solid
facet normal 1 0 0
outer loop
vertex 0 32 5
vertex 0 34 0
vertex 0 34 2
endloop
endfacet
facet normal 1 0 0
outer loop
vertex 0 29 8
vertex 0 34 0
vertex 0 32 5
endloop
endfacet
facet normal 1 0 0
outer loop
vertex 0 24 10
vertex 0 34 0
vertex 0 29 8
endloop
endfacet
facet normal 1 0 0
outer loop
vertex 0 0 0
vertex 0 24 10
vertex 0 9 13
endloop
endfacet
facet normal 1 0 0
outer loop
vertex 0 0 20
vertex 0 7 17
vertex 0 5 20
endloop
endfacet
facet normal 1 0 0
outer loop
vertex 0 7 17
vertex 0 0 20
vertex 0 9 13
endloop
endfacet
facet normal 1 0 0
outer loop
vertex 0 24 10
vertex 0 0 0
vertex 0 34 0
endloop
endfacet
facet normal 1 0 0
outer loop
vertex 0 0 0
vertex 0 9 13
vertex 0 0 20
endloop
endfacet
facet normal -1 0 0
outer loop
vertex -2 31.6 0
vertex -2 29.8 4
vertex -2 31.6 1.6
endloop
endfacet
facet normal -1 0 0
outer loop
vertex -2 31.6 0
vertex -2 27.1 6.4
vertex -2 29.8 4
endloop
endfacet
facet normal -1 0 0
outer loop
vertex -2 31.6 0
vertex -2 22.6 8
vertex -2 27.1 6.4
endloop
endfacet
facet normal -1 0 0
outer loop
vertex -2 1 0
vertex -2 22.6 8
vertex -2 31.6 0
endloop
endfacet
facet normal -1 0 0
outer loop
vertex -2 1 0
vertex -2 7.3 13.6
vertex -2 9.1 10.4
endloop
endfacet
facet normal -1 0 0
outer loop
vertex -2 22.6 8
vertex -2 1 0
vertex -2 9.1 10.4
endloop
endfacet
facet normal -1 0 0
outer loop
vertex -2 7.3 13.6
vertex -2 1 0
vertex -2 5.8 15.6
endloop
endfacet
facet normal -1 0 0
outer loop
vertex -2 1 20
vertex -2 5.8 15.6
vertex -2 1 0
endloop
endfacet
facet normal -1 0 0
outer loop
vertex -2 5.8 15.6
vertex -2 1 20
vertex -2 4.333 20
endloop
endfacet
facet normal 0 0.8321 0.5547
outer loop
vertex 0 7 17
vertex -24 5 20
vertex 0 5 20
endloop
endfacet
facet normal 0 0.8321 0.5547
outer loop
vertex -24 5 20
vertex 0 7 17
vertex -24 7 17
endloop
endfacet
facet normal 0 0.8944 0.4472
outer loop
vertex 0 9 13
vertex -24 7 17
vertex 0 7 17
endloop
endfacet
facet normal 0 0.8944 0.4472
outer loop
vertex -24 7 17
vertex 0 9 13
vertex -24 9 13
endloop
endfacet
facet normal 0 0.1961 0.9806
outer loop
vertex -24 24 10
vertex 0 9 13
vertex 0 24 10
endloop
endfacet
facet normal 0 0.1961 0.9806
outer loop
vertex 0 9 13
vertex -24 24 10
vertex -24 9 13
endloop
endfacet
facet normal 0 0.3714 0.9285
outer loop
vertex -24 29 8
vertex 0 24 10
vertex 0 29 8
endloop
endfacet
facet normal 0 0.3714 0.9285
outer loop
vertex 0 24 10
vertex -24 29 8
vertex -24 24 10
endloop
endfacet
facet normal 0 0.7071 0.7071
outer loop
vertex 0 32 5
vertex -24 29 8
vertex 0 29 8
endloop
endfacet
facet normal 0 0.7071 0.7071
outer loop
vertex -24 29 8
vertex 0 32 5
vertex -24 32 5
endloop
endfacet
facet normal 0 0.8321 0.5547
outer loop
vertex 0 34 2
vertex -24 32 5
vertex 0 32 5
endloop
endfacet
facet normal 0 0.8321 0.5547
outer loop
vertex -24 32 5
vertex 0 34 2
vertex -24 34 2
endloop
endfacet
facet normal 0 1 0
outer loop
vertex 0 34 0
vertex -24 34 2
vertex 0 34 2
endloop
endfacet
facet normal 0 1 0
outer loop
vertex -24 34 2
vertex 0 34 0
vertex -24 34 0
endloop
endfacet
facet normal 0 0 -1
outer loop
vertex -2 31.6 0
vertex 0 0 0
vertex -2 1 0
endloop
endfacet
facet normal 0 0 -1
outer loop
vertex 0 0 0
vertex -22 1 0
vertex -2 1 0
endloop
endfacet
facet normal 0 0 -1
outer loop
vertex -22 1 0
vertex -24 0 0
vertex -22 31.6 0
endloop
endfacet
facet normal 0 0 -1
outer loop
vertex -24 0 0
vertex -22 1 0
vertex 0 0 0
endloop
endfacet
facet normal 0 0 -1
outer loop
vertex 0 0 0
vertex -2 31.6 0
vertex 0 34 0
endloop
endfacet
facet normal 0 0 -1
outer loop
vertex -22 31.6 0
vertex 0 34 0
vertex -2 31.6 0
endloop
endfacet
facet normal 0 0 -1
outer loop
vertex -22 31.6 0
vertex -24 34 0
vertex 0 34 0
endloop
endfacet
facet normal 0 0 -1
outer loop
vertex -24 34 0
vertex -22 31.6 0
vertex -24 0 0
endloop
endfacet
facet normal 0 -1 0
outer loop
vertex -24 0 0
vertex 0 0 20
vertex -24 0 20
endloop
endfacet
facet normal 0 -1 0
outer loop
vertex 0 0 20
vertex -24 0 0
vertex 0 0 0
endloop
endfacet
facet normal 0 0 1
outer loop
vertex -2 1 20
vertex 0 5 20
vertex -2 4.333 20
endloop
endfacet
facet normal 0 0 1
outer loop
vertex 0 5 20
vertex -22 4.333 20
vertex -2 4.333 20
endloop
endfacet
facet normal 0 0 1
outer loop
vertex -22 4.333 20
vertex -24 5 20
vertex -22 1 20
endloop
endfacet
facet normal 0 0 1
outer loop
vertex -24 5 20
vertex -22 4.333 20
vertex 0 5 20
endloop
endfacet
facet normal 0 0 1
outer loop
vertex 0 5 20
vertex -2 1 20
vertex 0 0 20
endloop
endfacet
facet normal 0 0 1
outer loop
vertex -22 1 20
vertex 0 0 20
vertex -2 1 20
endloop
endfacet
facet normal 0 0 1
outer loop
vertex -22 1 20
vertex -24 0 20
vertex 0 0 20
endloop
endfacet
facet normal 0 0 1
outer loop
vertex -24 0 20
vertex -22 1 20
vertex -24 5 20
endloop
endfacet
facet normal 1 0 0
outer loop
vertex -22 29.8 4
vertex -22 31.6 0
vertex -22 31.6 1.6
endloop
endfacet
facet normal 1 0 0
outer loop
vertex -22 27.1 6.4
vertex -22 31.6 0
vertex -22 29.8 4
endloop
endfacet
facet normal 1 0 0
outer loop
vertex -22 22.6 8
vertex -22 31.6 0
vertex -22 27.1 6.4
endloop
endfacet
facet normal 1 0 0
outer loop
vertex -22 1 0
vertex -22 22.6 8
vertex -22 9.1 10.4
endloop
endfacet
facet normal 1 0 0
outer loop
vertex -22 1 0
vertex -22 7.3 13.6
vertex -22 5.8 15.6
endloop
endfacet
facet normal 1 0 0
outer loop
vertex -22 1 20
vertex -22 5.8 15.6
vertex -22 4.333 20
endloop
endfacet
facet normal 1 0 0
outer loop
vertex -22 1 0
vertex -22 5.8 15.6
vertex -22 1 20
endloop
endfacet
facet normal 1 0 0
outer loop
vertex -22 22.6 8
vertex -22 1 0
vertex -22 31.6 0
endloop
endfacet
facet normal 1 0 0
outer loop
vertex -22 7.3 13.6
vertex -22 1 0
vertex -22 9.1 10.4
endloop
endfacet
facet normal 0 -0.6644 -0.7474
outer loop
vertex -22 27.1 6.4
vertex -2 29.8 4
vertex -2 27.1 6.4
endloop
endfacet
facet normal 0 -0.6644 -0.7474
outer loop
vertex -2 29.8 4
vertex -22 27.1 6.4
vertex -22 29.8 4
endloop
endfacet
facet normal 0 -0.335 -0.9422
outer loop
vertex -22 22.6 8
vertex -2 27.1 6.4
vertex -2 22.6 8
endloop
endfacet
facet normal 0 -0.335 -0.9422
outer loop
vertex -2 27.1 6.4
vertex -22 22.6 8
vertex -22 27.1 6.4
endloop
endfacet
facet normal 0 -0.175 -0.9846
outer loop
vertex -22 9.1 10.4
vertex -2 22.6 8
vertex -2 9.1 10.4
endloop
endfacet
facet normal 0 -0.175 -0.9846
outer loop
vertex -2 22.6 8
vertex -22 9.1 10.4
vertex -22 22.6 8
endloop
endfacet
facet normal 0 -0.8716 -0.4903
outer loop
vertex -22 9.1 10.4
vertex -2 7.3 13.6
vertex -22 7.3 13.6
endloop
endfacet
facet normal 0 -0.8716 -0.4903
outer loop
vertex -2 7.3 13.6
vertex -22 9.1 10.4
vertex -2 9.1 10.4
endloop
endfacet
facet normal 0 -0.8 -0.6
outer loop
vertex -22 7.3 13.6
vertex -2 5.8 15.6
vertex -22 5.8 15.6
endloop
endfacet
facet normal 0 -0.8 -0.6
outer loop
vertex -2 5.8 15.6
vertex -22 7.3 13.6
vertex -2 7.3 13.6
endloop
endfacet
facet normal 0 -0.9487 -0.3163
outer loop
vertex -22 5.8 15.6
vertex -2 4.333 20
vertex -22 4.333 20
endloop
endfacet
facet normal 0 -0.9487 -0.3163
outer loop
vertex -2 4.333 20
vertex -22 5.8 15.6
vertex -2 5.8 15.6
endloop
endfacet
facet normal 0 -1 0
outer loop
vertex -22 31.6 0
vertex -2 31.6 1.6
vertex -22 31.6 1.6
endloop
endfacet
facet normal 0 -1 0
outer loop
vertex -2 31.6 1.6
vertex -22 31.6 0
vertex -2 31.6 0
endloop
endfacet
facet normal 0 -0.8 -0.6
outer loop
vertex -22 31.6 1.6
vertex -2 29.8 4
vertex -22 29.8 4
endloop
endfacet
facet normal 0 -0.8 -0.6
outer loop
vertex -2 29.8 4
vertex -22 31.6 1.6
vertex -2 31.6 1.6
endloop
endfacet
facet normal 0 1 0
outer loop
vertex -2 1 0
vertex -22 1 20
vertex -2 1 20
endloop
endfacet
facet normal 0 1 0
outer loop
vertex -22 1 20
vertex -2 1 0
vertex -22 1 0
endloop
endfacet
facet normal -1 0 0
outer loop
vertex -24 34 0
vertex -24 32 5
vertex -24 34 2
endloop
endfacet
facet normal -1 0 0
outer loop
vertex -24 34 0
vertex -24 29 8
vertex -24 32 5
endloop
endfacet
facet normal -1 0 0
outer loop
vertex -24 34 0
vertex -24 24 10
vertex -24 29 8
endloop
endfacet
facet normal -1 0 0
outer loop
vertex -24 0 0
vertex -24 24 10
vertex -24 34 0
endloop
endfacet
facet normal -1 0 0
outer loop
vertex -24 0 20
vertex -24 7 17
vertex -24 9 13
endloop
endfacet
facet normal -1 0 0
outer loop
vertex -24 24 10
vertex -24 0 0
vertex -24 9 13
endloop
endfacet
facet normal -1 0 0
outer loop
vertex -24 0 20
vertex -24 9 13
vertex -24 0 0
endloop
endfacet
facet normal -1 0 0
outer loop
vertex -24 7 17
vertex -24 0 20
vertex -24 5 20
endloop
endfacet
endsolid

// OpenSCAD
fanow=20;
fanoh=30;

/*difference()
{
  cube([fanow+2,fanoh+2,4]);
  translate([1,1,-.01]) cube([fanow,fanoh,4.02]);
}
*/

module scoop() {
  polygon([[0,0],[0,fanoh+4],[2,fanoh+4],[5,fanoh+2],
  
    [8,fanoh-1],
    [10,fanoh-6],
    [13,fanoh/2-6],[17,fanoh/2-8],[20,fanoh/2-10],[20,0]]);
}

rotate([0,-90]) {
linear_extrude(2) scoop();
translate([0,0,2]) linear_extrude(fanow)
difference(){
  scoop();
  translate([0,1]) scale([0.8,0.9,1.1]) scoop();
  polygon([[15,1],[15,6],[21,4],[21,1]]);
}
translate([0,0,fanow+2]) linear_extrude(2) scoop();
}
